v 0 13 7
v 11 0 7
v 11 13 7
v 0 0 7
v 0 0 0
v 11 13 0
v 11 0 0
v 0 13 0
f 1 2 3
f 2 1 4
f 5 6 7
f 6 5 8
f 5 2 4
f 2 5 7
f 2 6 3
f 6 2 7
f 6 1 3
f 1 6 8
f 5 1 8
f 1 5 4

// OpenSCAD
// Generated by SolidPython 1.0.1 on 2020-07-29 00:46:55


cube(size = [11, 13, 7]);
/***********************************************
*********      SolidPython code:      **********
************************************************
 
# import packages: SolidPython
from solid import *
from solid.utils import *
from itertools import chain, combinations, permutations


class Resize:

    def __init__(self, scad_file):
        self.scad_file = scad_file
        #self.scad_file = import_scad(scad_file)
        # cone/cylinder param:
        self.r1 = 0
        self.r2 = 0
        self.h = 0
        # rectangular prism param:
        self.w = 0
        self.l = 0
        # ellipse param:
        self.r = 0

    # import OpenScad code (file name corresponds to shape)


    # classify shape + parameters
    def assign(self, param1, param2, param3):
        if self.scad_file == 'cone.scad':
            self.r1 = param1
            self.r2 = param2
            self.h = param3
        elif self.scad_file == 'cylinder.scad':
            self.r1 = param1
            self.r2 = param2
            self.h = param3
        elif self.scad_file == 'rectangularPrism.scad':
            self.h = param1
            self.l = param2
            self.w = param3
        else:
            self.r = param1
            self.h = param2

    # resize parameters
    def iterate(self):
        x = range(3, 20, 2)
        i = 1
        if self.scad_file == 'cone.scad':
            tempList = list(permutations(x, 2))
            for temp in tempList:
                param1 = temp[0]
                param2 = temp[1]
                filepath = 'produced_scad_files/' + 'cone' + str(param1) + '_' + str(param2) + '_' + '.scad'
                scad_render_to_file(cylinder(h=param1, r1=param2, r2=0), filepath)

        elif self.scad_file == 'cylinder.scad':
            tempList = list(permutations(x, 3))
            for temp in tempList:
                param1 = temp[0]
                param2 = temp[1]
                filepath = 'produced_scad_files/' + 'cylinder' + str(param1) + '_' + str(param2) + '_' + '.scad'
                scad_render_to_file(cylinder(h=param1, r1=param2, r2=param2), filepath)

        elif self.scad_file == 'rectangularPrism.scad':
            tempList = list(permutations(x, 3))
            for temp in tempList:
                param1 = temp[0]
                param2 = temp[1]
                param3 = temp[2]
                filepath = 'produced_scad_files/' + 'rectangularPrism' + str(param1) + '_' + str(param2) + '_' + str(
                    param3) + '.scad'
                scad_render_to_file(cube(size=(param1, param2, param3)), filepath)

        elif self.scad_file == 'ellipse.scad':
            tempList = list(permutations(x, 4))
            for temp in tempList:
                param1 = temp[0]
                param2 = temp[1]
                param3 = temp[2]
                param4 = temp[3]
                filepath = 'produced_scad_files/' + 'ellipse' + str(param1) + '_' + str(param2) + '_' + str(param3) + '_' + str(param4) + '.scad'
                scad_render_to_file(scale([param1, param2, param3])(sphere(r=param4)), filepath)

    def render_to_scadfile(self):
        scad_render_to_file(scad, 'example.scad') 
 
************************************************/
